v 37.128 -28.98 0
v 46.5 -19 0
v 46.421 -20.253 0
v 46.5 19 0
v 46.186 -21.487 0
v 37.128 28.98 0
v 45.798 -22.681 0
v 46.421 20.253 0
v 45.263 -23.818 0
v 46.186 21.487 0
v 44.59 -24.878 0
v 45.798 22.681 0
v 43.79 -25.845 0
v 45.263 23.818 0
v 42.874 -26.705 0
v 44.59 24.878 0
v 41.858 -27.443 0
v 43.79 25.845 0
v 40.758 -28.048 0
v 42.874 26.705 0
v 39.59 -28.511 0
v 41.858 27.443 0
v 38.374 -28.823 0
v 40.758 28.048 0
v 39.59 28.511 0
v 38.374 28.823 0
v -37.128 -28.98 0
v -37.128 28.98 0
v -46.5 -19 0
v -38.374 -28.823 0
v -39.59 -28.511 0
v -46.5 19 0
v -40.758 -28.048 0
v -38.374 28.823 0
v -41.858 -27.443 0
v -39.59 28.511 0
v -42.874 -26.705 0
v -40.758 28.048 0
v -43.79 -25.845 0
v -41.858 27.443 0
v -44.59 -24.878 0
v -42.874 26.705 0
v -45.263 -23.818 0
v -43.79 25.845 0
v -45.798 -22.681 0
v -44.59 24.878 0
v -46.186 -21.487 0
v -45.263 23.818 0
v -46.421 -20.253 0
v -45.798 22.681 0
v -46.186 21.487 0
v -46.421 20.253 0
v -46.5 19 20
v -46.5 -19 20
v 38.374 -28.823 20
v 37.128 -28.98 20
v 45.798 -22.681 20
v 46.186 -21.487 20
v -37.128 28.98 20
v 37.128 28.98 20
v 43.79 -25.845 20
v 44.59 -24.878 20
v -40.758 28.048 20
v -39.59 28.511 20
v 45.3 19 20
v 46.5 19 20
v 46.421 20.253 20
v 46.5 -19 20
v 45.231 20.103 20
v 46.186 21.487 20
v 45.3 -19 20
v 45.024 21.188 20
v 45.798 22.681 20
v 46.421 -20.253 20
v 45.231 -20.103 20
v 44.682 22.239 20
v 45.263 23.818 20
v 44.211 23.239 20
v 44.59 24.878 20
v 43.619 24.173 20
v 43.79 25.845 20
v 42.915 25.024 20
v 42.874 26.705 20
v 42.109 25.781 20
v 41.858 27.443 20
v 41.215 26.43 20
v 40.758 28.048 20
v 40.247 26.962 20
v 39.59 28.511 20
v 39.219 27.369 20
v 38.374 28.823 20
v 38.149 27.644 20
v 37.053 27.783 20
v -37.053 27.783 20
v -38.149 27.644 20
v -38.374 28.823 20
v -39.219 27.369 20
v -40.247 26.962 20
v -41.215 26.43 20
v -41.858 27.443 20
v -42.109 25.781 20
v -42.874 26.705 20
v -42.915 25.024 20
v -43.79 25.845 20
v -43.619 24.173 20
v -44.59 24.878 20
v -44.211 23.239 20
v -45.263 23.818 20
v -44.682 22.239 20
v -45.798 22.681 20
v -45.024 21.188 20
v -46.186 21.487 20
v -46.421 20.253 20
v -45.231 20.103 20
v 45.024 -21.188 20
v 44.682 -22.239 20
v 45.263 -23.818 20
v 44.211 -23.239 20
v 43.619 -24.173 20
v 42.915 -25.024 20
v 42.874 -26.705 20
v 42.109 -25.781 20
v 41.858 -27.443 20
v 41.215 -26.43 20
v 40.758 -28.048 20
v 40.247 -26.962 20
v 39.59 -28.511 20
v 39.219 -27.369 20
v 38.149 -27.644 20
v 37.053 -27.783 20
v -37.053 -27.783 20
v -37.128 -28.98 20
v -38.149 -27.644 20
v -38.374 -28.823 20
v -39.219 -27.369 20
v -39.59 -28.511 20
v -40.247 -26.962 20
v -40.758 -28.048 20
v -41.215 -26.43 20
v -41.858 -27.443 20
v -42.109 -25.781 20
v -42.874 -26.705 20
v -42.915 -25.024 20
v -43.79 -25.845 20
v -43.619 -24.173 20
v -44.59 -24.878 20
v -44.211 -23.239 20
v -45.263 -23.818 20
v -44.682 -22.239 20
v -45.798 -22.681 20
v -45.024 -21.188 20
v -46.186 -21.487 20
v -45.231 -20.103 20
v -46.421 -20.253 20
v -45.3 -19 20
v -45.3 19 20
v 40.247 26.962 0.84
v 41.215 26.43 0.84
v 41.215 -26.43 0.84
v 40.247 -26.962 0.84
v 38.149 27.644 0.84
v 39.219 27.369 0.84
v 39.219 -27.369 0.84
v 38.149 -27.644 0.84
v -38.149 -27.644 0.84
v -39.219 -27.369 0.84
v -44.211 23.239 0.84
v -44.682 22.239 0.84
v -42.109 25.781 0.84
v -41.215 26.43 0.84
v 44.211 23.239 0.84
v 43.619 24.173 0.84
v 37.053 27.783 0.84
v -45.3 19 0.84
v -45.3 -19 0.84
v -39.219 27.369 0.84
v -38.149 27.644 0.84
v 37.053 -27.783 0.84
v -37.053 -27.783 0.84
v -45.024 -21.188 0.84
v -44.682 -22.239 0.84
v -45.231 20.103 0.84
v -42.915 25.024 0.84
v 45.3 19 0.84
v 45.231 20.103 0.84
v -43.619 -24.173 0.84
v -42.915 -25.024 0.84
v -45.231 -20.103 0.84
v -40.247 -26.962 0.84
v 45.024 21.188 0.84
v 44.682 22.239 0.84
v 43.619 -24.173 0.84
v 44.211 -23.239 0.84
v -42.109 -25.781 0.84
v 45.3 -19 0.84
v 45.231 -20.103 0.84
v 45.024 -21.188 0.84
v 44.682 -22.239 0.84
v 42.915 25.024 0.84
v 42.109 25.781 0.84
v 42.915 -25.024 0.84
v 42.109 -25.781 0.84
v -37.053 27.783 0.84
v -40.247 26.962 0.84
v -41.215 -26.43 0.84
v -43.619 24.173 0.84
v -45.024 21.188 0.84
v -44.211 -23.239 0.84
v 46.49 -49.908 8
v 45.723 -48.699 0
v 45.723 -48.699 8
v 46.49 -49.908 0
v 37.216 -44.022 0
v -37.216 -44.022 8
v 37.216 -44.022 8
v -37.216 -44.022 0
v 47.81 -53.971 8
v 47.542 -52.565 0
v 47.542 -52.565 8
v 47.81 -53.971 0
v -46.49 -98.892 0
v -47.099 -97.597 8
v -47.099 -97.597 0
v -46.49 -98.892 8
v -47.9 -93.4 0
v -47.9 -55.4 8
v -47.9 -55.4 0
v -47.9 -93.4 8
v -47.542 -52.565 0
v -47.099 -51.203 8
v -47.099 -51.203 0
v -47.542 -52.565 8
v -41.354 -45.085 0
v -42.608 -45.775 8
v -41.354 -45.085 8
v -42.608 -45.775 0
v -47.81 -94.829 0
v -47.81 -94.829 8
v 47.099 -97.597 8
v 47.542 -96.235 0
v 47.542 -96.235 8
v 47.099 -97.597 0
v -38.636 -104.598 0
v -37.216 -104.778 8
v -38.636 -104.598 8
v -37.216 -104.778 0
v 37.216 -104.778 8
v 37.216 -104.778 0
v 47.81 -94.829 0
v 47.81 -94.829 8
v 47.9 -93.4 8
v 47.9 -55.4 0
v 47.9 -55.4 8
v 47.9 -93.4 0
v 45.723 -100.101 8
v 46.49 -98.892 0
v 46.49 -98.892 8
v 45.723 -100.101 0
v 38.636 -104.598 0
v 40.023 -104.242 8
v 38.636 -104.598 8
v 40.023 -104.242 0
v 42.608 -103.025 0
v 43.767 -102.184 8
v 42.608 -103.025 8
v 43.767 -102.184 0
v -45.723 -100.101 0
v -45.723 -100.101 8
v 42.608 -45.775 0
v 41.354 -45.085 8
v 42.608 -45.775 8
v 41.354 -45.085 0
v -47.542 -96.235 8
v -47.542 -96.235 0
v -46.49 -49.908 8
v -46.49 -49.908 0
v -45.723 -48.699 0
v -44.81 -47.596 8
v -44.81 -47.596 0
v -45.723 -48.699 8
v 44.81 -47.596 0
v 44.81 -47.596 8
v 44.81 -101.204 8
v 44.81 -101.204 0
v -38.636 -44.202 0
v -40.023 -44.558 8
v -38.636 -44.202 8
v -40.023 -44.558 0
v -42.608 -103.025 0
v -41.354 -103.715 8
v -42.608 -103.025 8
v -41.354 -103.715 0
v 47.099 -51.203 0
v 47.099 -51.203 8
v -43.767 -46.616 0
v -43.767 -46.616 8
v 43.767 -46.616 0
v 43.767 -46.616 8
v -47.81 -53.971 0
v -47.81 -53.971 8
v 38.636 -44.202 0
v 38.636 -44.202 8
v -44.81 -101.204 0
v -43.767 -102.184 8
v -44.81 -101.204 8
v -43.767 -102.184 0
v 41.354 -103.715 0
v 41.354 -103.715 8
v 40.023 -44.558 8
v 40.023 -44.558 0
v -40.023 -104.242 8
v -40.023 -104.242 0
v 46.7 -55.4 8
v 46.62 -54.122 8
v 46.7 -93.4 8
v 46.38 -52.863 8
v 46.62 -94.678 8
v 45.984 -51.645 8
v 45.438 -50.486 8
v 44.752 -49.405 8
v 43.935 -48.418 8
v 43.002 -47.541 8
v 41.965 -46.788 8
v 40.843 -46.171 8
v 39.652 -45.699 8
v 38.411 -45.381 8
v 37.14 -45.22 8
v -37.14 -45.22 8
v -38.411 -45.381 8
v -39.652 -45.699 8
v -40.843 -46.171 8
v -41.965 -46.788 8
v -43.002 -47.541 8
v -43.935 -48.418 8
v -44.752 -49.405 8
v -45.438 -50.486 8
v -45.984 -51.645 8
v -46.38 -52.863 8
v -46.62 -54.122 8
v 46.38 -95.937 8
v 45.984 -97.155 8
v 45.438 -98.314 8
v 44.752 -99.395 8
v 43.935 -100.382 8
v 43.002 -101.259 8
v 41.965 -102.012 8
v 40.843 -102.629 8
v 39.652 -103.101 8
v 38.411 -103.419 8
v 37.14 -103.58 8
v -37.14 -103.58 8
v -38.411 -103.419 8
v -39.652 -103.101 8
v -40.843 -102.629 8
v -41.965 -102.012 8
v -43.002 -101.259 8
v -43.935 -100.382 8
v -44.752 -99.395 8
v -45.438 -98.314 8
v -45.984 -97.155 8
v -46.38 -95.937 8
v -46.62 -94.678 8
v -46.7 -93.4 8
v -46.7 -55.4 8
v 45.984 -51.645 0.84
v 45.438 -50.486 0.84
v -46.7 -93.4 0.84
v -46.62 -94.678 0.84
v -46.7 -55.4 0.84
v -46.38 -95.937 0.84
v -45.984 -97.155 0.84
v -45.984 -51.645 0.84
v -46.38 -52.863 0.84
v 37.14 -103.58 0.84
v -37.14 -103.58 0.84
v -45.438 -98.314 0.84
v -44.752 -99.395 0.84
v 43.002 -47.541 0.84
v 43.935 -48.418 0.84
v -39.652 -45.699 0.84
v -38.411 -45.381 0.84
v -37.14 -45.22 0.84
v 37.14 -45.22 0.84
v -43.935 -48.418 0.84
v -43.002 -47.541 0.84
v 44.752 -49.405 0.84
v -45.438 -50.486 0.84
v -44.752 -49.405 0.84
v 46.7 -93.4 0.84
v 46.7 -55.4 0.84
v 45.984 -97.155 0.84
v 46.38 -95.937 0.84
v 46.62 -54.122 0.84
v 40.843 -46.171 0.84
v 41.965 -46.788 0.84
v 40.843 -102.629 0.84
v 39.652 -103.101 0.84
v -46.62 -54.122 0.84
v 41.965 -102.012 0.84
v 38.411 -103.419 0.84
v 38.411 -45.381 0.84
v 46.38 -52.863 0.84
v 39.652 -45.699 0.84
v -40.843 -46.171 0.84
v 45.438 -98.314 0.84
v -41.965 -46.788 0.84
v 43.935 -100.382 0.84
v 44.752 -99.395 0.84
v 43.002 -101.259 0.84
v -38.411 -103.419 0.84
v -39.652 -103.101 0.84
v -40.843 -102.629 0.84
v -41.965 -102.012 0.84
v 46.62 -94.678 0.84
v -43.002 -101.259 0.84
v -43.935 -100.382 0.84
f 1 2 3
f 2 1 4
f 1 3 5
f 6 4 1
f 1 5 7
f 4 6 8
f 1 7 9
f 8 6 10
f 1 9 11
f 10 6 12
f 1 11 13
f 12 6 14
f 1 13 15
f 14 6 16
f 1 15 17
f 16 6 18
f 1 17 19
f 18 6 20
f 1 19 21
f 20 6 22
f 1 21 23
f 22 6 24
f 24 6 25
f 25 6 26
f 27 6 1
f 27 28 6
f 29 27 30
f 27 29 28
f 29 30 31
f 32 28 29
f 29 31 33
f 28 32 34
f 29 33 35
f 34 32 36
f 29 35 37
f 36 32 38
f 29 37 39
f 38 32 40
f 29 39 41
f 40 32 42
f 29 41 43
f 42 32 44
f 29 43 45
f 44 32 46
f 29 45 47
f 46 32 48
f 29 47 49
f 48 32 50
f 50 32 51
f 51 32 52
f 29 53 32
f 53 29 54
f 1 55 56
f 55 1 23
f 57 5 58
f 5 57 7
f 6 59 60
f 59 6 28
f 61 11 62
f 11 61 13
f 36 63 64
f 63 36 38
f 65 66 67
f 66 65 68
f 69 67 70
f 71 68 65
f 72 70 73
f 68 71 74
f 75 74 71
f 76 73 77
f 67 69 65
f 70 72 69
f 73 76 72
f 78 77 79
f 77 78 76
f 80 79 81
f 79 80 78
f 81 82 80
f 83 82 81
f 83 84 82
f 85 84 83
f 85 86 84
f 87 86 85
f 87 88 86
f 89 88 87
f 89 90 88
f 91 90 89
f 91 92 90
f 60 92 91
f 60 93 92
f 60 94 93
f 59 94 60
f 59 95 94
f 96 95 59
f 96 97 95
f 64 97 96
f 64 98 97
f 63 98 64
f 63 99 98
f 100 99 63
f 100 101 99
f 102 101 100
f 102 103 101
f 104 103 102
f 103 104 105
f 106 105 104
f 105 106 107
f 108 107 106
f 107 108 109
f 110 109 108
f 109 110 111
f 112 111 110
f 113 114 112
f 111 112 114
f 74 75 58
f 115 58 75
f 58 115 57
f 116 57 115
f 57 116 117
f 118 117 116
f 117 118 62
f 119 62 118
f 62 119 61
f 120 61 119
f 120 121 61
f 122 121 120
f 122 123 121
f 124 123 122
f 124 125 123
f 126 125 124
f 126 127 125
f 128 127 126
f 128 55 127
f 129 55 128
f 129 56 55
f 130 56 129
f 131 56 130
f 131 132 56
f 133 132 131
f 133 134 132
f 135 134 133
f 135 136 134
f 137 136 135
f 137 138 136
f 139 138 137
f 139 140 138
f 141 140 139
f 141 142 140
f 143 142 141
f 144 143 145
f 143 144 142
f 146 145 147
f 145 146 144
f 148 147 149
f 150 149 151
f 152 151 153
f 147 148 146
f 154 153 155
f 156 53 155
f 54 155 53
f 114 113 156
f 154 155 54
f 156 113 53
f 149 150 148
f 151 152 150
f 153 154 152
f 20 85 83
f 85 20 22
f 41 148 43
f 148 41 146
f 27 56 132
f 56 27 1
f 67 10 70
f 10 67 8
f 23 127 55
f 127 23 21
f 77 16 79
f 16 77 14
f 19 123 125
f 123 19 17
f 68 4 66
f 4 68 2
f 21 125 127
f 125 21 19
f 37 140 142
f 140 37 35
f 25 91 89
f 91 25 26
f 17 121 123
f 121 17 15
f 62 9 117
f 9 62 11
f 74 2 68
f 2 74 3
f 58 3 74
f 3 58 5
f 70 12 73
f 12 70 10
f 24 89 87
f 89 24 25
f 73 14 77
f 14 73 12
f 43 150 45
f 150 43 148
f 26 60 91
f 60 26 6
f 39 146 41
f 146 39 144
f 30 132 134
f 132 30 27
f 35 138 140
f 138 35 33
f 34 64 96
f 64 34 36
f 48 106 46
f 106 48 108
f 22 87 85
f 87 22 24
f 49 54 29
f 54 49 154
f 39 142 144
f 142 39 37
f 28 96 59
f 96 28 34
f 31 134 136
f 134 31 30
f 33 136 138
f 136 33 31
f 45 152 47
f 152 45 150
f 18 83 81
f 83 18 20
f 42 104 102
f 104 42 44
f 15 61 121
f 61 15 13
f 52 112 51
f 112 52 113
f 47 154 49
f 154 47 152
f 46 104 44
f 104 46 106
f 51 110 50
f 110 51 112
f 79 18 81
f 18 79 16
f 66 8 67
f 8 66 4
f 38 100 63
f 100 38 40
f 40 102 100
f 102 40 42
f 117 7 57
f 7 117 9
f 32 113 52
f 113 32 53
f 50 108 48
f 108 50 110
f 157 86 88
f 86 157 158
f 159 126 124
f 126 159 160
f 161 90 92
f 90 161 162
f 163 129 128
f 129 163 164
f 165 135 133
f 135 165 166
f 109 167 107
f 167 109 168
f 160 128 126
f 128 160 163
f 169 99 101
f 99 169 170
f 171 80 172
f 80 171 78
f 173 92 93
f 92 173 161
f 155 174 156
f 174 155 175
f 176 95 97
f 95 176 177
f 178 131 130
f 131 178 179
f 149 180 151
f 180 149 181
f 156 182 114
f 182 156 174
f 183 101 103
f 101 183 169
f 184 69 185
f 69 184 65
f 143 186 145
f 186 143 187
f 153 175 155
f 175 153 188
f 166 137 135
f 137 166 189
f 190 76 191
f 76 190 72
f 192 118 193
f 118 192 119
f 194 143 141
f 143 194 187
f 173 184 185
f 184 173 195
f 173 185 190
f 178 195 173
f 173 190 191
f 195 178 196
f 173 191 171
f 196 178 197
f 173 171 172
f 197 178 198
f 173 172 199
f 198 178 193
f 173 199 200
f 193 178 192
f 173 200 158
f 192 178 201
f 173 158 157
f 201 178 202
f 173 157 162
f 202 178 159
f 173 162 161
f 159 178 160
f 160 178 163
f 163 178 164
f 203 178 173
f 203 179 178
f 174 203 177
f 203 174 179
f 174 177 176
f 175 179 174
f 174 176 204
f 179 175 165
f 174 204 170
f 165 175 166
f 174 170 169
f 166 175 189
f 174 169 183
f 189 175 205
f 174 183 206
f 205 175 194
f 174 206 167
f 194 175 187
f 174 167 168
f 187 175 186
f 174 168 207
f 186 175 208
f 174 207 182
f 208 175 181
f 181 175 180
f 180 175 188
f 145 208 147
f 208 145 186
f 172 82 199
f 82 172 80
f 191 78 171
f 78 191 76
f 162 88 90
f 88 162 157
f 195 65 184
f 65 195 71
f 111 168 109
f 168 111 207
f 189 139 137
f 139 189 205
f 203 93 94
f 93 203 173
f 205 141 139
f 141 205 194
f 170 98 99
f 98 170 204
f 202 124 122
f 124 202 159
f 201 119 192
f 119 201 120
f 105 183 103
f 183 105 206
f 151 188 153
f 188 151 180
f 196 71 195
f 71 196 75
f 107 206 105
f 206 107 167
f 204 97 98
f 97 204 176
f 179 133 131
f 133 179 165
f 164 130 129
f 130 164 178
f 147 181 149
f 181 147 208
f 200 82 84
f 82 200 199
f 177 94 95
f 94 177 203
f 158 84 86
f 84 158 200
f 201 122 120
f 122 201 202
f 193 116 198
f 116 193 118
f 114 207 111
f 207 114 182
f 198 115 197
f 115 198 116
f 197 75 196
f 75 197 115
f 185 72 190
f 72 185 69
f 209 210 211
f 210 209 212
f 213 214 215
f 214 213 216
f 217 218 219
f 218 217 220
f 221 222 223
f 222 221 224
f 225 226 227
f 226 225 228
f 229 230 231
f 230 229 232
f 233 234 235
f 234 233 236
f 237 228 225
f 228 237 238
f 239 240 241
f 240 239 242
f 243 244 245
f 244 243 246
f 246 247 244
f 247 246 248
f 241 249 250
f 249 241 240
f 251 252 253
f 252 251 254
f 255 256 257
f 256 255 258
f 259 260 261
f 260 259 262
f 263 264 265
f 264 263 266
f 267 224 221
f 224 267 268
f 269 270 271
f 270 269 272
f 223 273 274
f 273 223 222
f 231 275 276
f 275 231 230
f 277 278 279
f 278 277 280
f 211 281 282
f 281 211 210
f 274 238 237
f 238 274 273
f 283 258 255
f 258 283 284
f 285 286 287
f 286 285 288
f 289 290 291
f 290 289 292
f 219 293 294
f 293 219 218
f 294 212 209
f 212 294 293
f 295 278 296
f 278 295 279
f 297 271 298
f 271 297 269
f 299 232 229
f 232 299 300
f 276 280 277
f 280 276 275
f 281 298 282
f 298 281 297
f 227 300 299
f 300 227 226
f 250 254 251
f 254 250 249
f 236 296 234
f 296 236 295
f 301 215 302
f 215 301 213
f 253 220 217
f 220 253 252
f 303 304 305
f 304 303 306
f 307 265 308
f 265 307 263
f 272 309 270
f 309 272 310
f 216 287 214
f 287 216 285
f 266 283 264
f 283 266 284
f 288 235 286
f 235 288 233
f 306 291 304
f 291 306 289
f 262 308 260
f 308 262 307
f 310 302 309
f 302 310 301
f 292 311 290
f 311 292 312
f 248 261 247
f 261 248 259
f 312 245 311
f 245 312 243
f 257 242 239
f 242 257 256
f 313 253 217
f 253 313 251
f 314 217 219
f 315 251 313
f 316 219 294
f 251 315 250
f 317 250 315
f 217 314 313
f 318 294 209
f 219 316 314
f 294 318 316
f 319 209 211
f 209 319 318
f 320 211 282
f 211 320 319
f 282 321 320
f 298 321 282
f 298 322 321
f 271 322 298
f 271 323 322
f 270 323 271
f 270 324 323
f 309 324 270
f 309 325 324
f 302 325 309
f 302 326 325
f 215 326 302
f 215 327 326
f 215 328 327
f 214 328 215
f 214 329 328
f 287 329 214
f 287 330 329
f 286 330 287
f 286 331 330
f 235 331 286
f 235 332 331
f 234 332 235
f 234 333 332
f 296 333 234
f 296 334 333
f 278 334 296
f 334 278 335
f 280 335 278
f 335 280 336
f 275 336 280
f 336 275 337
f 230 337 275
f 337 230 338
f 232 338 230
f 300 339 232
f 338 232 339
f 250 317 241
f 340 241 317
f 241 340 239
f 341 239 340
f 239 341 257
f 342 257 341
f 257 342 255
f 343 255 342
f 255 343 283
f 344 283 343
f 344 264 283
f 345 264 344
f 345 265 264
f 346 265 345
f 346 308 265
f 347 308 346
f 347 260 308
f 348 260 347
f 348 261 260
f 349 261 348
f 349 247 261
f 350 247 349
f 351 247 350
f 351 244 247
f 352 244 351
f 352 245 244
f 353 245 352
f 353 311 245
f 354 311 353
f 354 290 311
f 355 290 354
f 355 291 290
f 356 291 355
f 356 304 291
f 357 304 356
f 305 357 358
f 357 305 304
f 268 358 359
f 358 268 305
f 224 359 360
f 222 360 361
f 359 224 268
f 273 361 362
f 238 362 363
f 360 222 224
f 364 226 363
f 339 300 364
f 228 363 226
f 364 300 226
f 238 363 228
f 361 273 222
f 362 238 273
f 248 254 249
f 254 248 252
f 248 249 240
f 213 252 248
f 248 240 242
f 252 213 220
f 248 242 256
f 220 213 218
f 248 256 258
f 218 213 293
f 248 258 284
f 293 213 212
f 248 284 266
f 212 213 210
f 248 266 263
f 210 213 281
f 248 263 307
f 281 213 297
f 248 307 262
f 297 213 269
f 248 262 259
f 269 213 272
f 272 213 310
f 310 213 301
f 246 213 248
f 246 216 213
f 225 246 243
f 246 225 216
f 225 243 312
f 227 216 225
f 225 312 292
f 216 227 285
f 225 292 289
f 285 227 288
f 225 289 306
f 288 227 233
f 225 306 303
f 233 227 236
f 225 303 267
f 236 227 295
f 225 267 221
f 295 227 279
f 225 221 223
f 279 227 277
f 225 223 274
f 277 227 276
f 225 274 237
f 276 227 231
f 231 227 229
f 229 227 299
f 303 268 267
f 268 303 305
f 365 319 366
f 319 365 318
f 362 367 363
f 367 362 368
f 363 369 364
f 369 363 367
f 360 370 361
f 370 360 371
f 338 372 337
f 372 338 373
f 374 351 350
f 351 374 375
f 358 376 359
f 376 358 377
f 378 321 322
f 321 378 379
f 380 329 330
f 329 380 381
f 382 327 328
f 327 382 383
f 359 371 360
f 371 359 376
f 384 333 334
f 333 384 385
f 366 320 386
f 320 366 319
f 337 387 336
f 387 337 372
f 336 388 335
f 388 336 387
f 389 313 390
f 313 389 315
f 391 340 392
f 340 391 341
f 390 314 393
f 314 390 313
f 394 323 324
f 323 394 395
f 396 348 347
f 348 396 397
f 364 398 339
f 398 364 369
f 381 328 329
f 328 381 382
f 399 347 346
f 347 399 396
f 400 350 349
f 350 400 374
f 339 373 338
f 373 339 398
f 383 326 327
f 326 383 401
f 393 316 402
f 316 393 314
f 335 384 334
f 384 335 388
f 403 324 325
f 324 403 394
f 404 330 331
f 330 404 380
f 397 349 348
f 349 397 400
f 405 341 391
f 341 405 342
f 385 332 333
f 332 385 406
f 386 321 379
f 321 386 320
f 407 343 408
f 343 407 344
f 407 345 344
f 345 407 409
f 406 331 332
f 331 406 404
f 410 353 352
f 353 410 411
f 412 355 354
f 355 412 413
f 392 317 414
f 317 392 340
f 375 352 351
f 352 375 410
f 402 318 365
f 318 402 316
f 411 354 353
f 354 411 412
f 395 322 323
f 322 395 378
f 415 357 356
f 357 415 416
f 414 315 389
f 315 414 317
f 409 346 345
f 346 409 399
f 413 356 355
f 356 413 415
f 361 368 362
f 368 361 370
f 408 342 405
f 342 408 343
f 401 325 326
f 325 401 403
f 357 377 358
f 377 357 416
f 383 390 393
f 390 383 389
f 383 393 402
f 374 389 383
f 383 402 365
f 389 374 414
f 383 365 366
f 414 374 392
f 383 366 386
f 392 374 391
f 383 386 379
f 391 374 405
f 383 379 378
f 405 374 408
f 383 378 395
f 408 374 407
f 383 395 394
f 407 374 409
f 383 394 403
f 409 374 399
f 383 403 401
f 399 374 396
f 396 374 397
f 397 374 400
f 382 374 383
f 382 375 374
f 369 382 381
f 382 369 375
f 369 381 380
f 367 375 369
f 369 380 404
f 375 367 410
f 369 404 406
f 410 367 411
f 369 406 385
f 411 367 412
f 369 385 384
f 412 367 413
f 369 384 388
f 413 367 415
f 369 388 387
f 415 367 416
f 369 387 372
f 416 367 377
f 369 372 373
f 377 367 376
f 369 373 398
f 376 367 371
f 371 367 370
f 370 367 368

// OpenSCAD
// preview[view:south west, tilt:top diagonal]

$fn=50 * 1;

part="both";// [first:Tin Only, second:Lid Only, both: Tin and Lid]

layer_height=.28;

nozzle_diameter=.4;

//(Used with Layer Height and Nozzle Diameter to calculate walls and top/bottom thickness)
perimeters=3;

//(Used with Nozzle Diameter to calculate the corner radius)
radius_perimeters=25;

//(Amount of extra space to put around the lid overlap)
tolerance=.2;

length=93;
width=58;
height=20;
lid_lip=8;

print_part();

module print_part()
{
        
    if(part=="first")
    {
        tin();
    }
    else if(part=="second")
    {
        lid();
    }
    else if(part=="both")
    {
        both();
    }else
    {
        both();
    }
}

module both()
{
    tin();
    translate([0,-length*.8,0])
    lid();
}

module tin()
{
    difference()
    {
        hull()
        {
            translate([-length/2+nozzle_diameter*radius_perimeters,-width/2+nozzle_diameter*radius_perimeters,0])
            cylinder(r=nozzle_diameter*radius_perimeters,h=height);

            translate([length/2-nozzle_diameter*radius_perimeters,-width/2+nozzle_diameter*radius_perimeters,0])
            cylinder(r=nozzle_diameter*radius_perimeters,h=height);

            translate([length/2-nozzle_diameter*radius_perimeters,width/2-nozzle_diameter*radius_perimeters,0])
            cylinder(r=nozzle_diameter*radius_perimeters,h=height);

            translate([-length/2+nozzle_diameter*radius_perimeters,width/2-nozzle_diameter*radius_perimeters,0])
            cylinder(r=nozzle_diameter*radius_perimeters,h=height);
        }

        translate([0,0,perimeters*layer_height])
        hull()
        {
            translate([-length/2+nozzle_diameter*radius_perimeters,-width/2+nozzle_diameter*radius_perimeters,0])
            cylinder(r=nozzle_diameter*radius_perimeters-(perimeters*nozzle_diameter),h=height);

            translate([length/2-nozzle_diameter*radius_perimeters,-width/2+nozzle_diameter*radius_perimeters,0])
            cylinder(r=nozzle_diameter*radius_perimeters-(perimeters*nozzle_diameter),h=height);

            translate([length/2-nozzle_diameter*radius_perimeters,width/2-nozzle_diameter*radius_perimeters,0])
            cylinder(r=nozzle_diameter*radius_perimeters-(perimeters*nozzle_diameter),h=height);

            translate([-length/2+nozzle_diameter*radius_perimeters,width/2-nozzle_diameter*radius_perimeters,0])
            cylinder(r=nozzle_diameter*radius_perimeters-(perimeters*nozzle_diameter),h=height);
        }
    }
}

module lid()
{
    difference()
    {       
        hull()
        {
            translate([-length/2+nozzle_diameter*radius_perimeters,-width/2+nozzle_diameter*radius_perimeters,0])
            cylinder(r=nozzle_diameter*radius_perimeters+(perimeters*nozzle_diameter)+tolerance,h=lid_lip);

            translate([length/2-nozzle_diameter*radius_perimeters,-width/2+nozzle_diameter*radius_perimeters,0])
            cylinder(r=nozzle_diameter*radius_perimeters+(perimeters*nozzle_diameter)+tolerance,h=lid_lip);

            translate([length/2-nozzle_diameter*radius_perimeters,width/2-nozzle_diameter*radius_perimeters,0])
            cylinder(r=nozzle_diameter*radius_perimeters+(perimeters*nozzle_diameter)+tolerance,h=lid_lip);

            translate([-length/2+nozzle_diameter*radius_perimeters,width/2-nozzle_diameter*radius_perimeters,0])
            cylinder(r=nozzle_diameter*radius_perimeters+(perimeters*nozzle_diameter)+tolerance,h=lid_lip);
        }

        translate([0,0,perimeters*layer_height])
        hull()
        {
            translate([-length/2+nozzle_diameter*radius_perimeters,-width/2+nozzle_diameter*radius_perimeters,0])
            cylinder(r=nozzle_diameter*radius_perimeters+tolerance,h=lid_lip);

            translate([length/2-nozzle_diameter*radius_perimeters,-width/2+nozzle_diameter*radius_perimeters,0])
            cylinder(r=nozzle_diameter*radius_perimeters+tolerance,h=lid_lip);

            translate([length/2-nozzle_diameter*radius_perimeters,width/2-nozzle_diameter*radius_perimeters,0])
            cylinder(r=nozzle_diameter*radius_perimeters+tolerance,h=lid_lip);

            translate([-length/2+nozzle_diameter*radius_perimeters,width/2-nozzle_diameter*radius_perimeters,0])
            cylinder(r=nozzle_diameter*radius_perimeters+tolerance,h=lid_lip);
        }
    }
}
